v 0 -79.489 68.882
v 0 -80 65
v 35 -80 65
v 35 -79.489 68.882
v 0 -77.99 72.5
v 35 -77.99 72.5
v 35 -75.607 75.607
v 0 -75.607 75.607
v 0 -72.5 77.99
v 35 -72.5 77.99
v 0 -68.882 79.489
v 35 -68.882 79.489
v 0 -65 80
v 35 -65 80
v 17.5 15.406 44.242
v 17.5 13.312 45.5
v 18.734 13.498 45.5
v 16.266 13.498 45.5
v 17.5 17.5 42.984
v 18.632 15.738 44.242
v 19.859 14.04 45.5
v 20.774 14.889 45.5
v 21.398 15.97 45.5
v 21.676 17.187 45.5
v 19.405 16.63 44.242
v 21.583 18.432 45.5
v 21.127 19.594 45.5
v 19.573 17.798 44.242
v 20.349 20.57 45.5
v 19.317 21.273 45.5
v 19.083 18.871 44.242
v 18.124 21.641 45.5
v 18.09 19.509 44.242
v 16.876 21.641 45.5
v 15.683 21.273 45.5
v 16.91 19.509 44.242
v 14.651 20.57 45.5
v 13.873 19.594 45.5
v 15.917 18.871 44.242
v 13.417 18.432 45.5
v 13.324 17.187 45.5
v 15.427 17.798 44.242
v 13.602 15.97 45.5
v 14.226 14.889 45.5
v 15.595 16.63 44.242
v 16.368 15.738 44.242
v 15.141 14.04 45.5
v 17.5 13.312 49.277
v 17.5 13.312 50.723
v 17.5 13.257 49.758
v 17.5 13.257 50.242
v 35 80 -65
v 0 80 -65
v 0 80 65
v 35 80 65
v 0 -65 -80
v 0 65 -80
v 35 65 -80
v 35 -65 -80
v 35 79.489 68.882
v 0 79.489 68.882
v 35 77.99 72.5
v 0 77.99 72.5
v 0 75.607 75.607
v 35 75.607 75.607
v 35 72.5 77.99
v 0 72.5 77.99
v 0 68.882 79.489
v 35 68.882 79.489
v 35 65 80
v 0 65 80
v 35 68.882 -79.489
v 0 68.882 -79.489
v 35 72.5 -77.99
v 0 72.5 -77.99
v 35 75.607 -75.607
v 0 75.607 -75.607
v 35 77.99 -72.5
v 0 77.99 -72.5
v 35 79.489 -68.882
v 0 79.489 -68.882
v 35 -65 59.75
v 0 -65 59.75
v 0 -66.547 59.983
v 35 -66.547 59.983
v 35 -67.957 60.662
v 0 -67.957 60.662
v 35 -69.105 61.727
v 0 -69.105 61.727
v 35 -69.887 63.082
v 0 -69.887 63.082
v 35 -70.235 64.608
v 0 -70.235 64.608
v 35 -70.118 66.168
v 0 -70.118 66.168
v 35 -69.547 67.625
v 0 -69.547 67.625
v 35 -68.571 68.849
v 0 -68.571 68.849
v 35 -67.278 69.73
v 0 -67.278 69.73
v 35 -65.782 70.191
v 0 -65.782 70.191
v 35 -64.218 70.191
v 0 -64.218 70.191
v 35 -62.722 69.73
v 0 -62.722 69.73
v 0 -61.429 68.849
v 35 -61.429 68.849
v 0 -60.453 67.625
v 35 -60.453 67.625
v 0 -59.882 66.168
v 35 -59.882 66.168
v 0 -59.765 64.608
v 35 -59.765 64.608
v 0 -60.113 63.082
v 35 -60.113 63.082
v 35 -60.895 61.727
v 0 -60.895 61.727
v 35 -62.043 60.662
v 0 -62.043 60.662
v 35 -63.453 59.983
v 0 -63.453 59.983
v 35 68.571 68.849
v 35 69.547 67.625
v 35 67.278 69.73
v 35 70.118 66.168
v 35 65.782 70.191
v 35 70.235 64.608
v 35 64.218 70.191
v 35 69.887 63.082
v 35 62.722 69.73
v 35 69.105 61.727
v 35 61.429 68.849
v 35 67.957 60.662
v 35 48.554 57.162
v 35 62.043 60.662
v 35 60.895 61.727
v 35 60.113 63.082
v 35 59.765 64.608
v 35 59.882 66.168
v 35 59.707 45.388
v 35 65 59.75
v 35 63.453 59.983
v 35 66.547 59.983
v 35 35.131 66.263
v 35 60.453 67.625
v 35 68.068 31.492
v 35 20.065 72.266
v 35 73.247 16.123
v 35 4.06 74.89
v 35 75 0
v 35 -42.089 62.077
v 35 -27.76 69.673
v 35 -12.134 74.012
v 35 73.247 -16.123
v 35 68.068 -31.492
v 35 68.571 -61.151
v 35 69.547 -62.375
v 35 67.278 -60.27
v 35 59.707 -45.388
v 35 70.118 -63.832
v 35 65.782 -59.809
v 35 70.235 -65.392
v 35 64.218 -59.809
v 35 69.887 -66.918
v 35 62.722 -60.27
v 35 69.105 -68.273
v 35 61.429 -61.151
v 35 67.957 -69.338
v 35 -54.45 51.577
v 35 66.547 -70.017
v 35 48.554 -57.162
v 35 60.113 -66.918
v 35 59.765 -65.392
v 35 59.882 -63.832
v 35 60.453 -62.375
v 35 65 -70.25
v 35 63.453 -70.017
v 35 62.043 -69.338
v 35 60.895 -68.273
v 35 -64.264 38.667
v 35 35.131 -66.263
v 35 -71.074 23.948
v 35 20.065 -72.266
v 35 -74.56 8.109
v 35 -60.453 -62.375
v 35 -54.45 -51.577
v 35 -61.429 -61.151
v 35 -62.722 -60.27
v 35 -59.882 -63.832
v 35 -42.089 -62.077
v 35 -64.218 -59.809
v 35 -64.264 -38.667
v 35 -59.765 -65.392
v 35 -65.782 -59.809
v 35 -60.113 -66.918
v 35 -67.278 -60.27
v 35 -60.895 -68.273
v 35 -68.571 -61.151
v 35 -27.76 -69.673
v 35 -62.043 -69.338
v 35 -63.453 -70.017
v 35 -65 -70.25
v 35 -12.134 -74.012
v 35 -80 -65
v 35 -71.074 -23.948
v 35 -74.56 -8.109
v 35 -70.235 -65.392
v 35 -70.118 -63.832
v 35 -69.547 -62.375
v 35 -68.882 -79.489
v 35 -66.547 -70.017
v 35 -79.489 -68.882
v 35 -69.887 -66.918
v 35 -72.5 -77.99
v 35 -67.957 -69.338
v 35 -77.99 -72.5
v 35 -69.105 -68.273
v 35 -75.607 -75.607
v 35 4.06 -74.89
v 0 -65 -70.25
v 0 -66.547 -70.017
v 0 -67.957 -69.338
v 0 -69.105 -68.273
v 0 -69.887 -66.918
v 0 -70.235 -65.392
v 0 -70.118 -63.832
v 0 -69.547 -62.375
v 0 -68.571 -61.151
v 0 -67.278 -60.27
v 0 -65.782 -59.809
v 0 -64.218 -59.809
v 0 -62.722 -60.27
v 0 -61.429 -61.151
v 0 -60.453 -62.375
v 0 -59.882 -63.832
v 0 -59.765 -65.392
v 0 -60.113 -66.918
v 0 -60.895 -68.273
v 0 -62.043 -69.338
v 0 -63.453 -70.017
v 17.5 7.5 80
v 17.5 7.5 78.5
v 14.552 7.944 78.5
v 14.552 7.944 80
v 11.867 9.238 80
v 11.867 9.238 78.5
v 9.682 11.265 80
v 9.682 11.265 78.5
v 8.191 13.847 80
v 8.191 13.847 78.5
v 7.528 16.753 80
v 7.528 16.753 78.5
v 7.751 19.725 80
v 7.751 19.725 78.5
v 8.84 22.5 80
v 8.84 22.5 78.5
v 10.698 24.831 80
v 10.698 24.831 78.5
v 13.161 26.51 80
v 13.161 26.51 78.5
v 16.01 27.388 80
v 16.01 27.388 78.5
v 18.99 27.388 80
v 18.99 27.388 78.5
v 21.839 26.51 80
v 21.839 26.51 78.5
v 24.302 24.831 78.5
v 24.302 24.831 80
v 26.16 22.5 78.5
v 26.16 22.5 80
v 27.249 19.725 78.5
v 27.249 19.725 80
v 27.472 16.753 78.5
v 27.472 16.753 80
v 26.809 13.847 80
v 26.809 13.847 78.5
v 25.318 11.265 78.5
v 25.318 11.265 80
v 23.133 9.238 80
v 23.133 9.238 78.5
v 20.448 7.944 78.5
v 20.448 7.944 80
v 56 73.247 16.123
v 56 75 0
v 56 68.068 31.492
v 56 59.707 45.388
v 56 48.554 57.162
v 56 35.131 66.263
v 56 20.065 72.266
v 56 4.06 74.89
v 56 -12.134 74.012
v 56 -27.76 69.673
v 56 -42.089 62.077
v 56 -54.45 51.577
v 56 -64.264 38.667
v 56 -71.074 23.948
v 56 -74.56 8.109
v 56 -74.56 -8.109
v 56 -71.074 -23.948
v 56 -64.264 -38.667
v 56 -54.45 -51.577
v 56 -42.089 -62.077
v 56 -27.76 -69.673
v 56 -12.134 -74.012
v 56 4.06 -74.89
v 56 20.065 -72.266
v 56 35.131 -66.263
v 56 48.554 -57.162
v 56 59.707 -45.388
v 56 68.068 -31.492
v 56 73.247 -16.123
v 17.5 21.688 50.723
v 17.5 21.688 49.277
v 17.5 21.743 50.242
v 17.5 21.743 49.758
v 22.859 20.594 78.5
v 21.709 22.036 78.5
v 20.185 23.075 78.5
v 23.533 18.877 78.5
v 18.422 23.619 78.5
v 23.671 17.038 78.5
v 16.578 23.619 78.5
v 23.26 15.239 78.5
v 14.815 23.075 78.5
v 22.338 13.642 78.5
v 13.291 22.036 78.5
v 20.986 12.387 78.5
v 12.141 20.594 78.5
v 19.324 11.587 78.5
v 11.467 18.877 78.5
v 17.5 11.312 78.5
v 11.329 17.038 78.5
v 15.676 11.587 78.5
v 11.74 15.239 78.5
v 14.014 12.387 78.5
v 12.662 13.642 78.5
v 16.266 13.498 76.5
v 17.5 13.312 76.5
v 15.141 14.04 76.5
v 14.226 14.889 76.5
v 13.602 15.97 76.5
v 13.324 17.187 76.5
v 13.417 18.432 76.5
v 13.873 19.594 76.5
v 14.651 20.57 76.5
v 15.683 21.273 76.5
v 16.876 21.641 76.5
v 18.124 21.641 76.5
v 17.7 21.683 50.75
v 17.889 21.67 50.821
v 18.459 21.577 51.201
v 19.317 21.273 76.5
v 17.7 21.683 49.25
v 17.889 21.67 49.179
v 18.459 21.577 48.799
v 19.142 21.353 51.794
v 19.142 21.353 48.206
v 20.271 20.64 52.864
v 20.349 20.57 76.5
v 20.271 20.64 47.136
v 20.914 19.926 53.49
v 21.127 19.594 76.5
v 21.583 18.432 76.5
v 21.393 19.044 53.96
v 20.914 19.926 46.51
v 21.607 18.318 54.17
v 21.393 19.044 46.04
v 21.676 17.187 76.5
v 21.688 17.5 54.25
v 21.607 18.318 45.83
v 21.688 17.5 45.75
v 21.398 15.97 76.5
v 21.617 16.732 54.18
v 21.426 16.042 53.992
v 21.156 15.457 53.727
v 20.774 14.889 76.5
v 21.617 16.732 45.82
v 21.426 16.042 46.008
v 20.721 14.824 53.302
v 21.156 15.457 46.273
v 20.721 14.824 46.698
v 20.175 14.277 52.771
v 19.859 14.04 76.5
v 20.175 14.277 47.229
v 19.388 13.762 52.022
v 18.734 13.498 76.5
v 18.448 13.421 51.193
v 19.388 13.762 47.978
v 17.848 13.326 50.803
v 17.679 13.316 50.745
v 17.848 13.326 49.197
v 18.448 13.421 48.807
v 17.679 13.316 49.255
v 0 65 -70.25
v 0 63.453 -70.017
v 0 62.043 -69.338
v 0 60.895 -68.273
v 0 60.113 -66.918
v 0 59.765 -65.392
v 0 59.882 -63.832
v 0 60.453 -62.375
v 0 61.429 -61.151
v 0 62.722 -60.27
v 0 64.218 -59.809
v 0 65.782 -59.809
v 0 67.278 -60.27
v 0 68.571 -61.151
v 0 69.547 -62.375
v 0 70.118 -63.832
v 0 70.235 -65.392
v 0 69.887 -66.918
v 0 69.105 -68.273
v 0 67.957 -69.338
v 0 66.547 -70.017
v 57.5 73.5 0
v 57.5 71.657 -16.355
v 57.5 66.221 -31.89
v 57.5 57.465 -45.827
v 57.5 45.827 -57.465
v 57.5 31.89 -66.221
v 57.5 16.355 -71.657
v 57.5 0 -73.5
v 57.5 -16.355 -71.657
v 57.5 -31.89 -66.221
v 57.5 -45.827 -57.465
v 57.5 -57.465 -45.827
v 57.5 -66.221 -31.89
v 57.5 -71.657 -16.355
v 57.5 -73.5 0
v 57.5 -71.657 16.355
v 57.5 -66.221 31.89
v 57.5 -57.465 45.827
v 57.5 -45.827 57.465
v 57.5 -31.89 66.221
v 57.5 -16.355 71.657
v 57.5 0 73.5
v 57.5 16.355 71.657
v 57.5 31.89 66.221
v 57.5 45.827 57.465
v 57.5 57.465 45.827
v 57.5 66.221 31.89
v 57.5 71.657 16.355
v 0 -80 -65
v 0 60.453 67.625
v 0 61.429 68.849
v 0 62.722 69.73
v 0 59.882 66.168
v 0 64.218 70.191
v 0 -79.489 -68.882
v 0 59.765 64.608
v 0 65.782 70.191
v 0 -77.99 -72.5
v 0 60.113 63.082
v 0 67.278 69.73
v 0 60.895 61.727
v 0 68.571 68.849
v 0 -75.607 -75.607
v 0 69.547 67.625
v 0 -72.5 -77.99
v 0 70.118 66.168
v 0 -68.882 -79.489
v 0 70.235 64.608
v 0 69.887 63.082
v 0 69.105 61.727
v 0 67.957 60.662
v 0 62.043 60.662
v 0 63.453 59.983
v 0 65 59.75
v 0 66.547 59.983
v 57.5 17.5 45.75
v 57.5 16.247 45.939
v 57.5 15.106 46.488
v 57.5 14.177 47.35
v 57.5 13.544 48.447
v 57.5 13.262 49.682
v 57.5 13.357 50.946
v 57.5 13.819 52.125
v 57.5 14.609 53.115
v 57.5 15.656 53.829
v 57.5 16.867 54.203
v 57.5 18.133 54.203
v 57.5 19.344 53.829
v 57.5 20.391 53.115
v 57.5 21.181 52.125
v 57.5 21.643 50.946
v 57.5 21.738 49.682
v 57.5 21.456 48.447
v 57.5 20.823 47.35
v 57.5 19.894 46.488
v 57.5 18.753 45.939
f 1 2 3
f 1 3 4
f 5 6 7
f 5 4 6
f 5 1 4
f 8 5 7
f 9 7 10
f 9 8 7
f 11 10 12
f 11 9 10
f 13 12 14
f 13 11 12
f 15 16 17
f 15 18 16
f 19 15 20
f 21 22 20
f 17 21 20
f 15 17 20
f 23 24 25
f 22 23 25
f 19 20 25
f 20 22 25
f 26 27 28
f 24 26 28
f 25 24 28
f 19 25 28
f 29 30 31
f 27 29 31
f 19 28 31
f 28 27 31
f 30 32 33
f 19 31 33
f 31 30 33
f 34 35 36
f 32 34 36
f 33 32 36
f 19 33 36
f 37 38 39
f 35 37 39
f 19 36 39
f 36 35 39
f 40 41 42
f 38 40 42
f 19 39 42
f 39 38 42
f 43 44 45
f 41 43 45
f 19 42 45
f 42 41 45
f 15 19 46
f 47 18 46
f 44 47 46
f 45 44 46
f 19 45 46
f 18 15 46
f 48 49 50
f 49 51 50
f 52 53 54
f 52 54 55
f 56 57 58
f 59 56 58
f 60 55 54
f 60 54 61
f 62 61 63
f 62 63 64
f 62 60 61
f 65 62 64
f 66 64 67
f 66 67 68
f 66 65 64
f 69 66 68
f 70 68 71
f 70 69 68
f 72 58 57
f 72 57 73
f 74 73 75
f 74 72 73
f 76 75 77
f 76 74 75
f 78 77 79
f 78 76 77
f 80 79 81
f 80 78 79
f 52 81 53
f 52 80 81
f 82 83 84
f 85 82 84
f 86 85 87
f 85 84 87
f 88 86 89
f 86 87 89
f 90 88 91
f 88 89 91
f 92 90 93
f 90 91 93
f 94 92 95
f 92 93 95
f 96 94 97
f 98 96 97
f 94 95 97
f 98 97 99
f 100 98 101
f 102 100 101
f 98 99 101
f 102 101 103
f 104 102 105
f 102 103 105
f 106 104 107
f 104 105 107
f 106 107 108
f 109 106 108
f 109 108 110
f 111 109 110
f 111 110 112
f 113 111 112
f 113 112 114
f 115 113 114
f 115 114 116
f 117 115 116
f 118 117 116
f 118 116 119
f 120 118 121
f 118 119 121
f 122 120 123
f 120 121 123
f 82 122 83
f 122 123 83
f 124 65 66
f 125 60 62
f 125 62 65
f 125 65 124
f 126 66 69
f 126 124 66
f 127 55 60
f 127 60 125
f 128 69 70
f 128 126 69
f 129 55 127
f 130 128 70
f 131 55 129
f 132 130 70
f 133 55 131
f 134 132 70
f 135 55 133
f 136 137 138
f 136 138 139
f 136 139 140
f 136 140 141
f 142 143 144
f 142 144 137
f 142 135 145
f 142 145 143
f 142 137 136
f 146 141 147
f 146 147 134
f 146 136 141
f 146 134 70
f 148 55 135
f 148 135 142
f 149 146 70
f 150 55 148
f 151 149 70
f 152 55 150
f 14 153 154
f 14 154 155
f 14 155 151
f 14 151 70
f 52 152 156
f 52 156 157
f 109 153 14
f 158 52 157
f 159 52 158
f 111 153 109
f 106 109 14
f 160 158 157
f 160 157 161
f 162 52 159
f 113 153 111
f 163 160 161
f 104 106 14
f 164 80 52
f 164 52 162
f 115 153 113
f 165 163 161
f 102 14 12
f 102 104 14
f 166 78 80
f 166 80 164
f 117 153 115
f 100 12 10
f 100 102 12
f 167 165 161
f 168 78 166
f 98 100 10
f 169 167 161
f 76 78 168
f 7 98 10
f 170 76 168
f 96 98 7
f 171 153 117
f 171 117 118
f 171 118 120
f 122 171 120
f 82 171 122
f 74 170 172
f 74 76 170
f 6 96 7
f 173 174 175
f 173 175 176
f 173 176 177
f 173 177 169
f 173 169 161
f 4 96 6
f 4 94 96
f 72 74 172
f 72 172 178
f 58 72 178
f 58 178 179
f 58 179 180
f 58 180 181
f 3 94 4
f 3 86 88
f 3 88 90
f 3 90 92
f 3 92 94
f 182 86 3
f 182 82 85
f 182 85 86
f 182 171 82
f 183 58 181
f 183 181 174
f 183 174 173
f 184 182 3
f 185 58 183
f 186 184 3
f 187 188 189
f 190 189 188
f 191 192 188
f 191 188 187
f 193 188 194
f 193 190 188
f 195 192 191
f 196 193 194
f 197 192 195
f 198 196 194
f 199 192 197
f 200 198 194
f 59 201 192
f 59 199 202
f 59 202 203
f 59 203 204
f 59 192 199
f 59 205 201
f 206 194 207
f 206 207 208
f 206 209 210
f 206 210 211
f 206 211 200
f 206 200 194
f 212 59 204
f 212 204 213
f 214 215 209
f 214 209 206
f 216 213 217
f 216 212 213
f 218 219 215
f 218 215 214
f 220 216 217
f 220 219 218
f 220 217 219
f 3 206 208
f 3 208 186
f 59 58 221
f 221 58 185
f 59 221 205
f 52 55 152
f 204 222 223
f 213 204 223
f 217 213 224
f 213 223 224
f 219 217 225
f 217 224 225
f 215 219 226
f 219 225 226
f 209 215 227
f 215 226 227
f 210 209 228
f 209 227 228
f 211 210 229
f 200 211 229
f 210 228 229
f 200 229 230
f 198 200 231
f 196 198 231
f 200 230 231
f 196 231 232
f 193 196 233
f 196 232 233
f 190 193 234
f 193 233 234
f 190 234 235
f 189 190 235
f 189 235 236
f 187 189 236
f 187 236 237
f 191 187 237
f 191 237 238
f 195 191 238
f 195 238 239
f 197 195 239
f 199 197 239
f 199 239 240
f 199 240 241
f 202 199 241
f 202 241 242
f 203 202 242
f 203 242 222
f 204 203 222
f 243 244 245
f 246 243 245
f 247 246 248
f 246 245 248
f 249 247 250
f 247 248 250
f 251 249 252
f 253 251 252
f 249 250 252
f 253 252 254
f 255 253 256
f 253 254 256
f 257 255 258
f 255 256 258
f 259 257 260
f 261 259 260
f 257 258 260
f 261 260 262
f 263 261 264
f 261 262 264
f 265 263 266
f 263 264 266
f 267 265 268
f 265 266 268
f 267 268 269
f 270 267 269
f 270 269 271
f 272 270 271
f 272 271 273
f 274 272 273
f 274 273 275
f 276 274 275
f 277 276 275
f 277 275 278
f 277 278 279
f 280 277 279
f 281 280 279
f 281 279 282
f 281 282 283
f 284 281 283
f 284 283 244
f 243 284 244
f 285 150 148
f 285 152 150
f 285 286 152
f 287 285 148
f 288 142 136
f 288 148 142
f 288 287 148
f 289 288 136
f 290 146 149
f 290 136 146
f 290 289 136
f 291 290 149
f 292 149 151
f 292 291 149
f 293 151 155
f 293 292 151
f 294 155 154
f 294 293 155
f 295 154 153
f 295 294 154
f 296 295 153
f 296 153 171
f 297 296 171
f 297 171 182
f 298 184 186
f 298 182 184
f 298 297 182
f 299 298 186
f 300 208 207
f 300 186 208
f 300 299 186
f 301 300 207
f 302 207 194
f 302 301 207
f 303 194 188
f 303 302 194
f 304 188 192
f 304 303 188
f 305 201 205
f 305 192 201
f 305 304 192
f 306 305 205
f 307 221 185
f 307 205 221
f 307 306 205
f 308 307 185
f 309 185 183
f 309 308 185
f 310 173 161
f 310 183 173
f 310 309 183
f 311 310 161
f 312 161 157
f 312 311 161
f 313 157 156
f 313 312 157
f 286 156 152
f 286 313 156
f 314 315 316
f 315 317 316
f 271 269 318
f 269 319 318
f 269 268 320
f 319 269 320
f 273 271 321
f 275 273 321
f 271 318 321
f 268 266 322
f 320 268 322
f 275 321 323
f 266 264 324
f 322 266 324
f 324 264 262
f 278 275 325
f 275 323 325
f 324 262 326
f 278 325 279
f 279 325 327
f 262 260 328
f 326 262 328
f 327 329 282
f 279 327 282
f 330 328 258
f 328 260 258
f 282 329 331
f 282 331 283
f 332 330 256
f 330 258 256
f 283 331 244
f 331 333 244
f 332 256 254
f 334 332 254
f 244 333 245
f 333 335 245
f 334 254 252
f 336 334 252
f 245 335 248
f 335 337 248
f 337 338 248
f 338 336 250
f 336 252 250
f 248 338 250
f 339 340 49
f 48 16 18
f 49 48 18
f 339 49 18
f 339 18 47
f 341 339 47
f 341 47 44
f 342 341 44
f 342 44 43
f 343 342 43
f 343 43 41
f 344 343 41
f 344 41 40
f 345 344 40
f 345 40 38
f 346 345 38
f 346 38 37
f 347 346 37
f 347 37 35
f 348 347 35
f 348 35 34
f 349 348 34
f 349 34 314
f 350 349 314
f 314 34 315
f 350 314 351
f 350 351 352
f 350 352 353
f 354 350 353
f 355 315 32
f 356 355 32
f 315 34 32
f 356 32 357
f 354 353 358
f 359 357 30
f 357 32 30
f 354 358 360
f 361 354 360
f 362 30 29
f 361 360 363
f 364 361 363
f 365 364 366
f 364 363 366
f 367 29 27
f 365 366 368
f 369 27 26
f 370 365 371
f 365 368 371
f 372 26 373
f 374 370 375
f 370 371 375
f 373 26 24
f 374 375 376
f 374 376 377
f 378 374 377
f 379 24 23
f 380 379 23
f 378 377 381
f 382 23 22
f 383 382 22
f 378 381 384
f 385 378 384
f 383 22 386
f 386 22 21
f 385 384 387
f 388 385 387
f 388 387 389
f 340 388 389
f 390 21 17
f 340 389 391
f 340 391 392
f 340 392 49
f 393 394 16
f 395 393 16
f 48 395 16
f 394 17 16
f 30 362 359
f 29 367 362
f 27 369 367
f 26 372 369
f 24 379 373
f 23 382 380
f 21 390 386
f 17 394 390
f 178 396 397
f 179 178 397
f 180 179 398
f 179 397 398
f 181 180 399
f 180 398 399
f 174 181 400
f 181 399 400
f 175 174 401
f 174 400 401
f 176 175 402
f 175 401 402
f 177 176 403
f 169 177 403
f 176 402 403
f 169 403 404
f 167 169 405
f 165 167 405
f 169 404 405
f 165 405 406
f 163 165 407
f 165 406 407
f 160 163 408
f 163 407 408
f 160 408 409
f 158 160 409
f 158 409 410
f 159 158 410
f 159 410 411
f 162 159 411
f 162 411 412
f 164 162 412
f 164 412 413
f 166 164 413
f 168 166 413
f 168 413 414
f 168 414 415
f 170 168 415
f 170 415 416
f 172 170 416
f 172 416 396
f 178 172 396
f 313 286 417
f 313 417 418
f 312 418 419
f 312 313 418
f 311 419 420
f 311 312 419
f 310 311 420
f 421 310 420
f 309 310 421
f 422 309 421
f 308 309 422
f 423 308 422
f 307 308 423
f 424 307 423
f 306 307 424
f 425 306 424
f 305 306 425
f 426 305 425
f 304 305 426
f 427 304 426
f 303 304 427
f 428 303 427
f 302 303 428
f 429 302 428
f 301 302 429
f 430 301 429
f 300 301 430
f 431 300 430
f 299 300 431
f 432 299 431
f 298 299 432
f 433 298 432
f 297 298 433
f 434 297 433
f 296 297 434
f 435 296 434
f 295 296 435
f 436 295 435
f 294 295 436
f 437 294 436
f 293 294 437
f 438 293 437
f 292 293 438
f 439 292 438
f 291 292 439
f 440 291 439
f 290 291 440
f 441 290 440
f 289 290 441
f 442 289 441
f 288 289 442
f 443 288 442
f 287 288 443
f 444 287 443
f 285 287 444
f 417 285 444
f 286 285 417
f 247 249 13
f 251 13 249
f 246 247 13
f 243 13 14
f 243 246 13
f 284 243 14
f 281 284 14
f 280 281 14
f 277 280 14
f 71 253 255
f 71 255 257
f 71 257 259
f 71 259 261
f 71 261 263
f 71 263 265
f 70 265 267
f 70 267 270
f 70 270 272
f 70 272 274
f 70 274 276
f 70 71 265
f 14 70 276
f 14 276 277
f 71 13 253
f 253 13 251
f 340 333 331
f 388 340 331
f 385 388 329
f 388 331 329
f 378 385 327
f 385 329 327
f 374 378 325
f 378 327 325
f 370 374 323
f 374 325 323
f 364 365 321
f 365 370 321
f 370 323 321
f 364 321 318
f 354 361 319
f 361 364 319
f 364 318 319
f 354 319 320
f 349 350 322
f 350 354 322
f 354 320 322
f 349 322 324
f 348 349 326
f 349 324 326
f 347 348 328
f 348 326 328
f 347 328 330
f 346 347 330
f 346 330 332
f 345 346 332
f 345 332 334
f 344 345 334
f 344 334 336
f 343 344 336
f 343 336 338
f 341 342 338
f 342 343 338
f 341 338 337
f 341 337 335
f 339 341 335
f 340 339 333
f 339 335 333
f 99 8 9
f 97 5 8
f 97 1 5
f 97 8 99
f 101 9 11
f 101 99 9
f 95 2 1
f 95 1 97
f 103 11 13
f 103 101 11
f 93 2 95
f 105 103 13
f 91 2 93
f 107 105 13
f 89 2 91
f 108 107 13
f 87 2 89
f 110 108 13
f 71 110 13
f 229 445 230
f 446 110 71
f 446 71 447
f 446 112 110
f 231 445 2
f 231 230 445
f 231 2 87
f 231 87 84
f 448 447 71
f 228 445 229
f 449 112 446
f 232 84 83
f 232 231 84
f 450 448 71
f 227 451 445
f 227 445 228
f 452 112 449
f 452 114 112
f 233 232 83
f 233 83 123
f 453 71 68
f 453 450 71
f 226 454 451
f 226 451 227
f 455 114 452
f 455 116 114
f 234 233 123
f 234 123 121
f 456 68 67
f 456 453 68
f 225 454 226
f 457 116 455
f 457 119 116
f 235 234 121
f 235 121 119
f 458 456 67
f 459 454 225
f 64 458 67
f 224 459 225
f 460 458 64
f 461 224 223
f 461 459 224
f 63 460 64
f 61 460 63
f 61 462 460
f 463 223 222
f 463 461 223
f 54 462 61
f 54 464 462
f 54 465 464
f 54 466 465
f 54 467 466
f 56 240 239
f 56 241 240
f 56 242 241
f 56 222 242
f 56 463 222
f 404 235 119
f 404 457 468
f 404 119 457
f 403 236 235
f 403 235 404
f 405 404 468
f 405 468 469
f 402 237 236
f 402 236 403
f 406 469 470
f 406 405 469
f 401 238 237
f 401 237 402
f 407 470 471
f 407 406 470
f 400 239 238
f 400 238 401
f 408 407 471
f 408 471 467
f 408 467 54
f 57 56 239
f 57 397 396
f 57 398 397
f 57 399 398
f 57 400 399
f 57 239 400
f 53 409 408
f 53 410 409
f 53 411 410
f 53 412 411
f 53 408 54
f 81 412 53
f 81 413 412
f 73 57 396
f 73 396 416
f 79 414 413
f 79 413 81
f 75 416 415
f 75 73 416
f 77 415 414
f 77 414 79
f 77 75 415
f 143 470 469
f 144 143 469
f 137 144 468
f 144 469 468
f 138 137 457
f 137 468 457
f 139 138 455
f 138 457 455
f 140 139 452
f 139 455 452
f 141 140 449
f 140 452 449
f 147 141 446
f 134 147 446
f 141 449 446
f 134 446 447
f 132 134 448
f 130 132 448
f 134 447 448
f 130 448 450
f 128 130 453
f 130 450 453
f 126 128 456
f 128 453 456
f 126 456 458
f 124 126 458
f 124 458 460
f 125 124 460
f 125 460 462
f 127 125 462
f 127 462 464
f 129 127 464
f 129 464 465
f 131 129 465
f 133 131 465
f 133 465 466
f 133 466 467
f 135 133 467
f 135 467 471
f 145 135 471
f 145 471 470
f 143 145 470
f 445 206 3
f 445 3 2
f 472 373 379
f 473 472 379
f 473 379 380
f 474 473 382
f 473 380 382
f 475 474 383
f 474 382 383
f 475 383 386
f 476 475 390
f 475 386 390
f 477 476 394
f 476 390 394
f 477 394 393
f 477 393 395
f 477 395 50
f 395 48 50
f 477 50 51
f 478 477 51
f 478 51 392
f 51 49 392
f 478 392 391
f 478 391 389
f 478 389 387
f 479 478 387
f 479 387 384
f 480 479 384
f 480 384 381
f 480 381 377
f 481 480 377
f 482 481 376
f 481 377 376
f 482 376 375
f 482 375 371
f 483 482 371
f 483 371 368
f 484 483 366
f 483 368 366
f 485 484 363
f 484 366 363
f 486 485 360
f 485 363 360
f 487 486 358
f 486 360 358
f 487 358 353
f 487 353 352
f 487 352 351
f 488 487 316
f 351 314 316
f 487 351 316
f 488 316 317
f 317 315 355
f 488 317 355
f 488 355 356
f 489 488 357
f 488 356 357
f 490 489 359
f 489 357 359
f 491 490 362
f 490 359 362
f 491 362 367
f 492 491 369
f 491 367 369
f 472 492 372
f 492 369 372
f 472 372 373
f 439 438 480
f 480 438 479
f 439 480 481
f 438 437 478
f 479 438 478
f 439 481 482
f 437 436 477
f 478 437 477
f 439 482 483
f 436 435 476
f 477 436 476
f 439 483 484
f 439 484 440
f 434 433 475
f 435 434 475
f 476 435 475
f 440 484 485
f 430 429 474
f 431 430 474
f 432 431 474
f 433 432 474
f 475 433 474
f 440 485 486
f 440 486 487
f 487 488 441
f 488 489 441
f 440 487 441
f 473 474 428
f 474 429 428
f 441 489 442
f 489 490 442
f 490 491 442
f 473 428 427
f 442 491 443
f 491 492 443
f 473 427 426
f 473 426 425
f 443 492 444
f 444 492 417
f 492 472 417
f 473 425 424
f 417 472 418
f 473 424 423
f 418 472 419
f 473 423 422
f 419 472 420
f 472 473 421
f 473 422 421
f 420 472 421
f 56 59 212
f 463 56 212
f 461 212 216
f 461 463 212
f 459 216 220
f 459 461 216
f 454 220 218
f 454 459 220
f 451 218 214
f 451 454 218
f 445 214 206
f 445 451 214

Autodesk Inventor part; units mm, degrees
ref_plane "YZ Plane" through (0, 0, 0) normal (1, 0, 0) x (0, 1, 0)
ref_plane "XZ Plane" through (0, 0, 0) normal (0, 1, 0) x (-1, 0, 0)
ref_plane "XY Plane" through (0, 0, 0) normal (0, 0, 1) x (1, 0, 0)
sketch "Skizze1" plane through (0, 0, 0) normal (0, 0, 1) x (1, 0, 0)
  line L0 (0, 80) -> (35, 80)
  line L1 (35, 80) -> (35, -80)
  line L2 (35, -80) -> (0, -80)
  line L3 (0, -80) -> (0, 80)
  line L4 (35, 75) -> (57.5, 75)
  line L5 (57.5, 75) -> (57.5, 0)
  line L6 (57.5, 0) -> (35, 0)
  line L7 (35, 0) -> (35, 75)
  point P0 (0, 0)
  point P1 (0, 0)
  dimension "d0" = 160
  dimension "d1" = 150
  dimension "d2" = 57.5
  dimension "d3" = 35
extrude "Extrusion1" add sketch "Skizze1" along normal mid plane 160 contours L0 L1 L2 L3
revolve "Umdrehung1" add sketch "Skizze1" angle 360 about axis through (57.5, 0, 0) along (-1, 0, 0) contours L4 L5 L6 L1
fillet "Rundung1" radius 15 4 edges at (17.5, 80, 80) (17.5, 80, -80) (17.5, -80, 80) (17.5, -80, -80)
sketch "Skizze2" plane through (35, -65, -80) normal (1, 0, 0) x (0, 0, -1)
  line L0 (-15, 0) -> (-145, 0)
  line L1 (-145, 0) -> (-145, 130)
  line L2 (-145, 130) -> (-15, 130)
  line L3 (-15, 130) -> (-15, 0)
  line L4 (-15, 0) -> (-145, 130) construction
  line L5 (-145, 0) -> (-15, 130) construction
  point P0 (-80, 65)
  dimension "d8" = 130
  dimension "d9" = 130
hole "Bohrung1" at (35, 65, 65) at (35, 65, -65) at (35, -65, 65) at (35, -65, -65) direction (-1, 0, 0) diameter 10.5 end through all
sketch "Skizze3" plane through (0, 0, 80) normal (0, 0, 1) x (1, 0, 0)
  line L0 (35, 80) -> (0, 80) projected
  line L1 (0, 65) -> (0, -65) projected
  point P0 (0, 0)
  point P1 (17.5, 17.5)
  dimension "d17" = 62.5
  dimension "d18" = 17.5
hole "Bohrung2" at (17.5, 17.5, 80) direction (0, 0, -1) diameter 8.376 depth 34.5 tip angle 118 counterbore diameter 20 counterbore depth 1.5 thread size "M10x1.5" class "6H" standard "ISO Metric profile"
sketch "Skizze4" plane through (57.5, 0, 0) normal (1, 0, 0) x (0, 0, -1)
  line L0 (-80, -65) -> (-80, 65) projected
  line L1 (65, 80) -> (-65, 80) projected
  point P0 (0, 0)
  point P1 (-50, 17.5)
  dimension "d26" = 30
  dimension "d27" = 62.5
hole "Bohrung3" at (57.5, 17.5, 50) direction (-1, 0, 0) diameter 8.5 depth 40 tip angle 118
chamfer "Fase1" distance 2 angle 45 1 edges at (17.5, 21.688, 78.5)
chamfer "Fase2" distance 1.5 angle 45 1 edges at (57.5, -75, 0)
equation "\"d4\" = d0"
properties part number "Deckel_hinten" material "Stahl AISI 4130"
